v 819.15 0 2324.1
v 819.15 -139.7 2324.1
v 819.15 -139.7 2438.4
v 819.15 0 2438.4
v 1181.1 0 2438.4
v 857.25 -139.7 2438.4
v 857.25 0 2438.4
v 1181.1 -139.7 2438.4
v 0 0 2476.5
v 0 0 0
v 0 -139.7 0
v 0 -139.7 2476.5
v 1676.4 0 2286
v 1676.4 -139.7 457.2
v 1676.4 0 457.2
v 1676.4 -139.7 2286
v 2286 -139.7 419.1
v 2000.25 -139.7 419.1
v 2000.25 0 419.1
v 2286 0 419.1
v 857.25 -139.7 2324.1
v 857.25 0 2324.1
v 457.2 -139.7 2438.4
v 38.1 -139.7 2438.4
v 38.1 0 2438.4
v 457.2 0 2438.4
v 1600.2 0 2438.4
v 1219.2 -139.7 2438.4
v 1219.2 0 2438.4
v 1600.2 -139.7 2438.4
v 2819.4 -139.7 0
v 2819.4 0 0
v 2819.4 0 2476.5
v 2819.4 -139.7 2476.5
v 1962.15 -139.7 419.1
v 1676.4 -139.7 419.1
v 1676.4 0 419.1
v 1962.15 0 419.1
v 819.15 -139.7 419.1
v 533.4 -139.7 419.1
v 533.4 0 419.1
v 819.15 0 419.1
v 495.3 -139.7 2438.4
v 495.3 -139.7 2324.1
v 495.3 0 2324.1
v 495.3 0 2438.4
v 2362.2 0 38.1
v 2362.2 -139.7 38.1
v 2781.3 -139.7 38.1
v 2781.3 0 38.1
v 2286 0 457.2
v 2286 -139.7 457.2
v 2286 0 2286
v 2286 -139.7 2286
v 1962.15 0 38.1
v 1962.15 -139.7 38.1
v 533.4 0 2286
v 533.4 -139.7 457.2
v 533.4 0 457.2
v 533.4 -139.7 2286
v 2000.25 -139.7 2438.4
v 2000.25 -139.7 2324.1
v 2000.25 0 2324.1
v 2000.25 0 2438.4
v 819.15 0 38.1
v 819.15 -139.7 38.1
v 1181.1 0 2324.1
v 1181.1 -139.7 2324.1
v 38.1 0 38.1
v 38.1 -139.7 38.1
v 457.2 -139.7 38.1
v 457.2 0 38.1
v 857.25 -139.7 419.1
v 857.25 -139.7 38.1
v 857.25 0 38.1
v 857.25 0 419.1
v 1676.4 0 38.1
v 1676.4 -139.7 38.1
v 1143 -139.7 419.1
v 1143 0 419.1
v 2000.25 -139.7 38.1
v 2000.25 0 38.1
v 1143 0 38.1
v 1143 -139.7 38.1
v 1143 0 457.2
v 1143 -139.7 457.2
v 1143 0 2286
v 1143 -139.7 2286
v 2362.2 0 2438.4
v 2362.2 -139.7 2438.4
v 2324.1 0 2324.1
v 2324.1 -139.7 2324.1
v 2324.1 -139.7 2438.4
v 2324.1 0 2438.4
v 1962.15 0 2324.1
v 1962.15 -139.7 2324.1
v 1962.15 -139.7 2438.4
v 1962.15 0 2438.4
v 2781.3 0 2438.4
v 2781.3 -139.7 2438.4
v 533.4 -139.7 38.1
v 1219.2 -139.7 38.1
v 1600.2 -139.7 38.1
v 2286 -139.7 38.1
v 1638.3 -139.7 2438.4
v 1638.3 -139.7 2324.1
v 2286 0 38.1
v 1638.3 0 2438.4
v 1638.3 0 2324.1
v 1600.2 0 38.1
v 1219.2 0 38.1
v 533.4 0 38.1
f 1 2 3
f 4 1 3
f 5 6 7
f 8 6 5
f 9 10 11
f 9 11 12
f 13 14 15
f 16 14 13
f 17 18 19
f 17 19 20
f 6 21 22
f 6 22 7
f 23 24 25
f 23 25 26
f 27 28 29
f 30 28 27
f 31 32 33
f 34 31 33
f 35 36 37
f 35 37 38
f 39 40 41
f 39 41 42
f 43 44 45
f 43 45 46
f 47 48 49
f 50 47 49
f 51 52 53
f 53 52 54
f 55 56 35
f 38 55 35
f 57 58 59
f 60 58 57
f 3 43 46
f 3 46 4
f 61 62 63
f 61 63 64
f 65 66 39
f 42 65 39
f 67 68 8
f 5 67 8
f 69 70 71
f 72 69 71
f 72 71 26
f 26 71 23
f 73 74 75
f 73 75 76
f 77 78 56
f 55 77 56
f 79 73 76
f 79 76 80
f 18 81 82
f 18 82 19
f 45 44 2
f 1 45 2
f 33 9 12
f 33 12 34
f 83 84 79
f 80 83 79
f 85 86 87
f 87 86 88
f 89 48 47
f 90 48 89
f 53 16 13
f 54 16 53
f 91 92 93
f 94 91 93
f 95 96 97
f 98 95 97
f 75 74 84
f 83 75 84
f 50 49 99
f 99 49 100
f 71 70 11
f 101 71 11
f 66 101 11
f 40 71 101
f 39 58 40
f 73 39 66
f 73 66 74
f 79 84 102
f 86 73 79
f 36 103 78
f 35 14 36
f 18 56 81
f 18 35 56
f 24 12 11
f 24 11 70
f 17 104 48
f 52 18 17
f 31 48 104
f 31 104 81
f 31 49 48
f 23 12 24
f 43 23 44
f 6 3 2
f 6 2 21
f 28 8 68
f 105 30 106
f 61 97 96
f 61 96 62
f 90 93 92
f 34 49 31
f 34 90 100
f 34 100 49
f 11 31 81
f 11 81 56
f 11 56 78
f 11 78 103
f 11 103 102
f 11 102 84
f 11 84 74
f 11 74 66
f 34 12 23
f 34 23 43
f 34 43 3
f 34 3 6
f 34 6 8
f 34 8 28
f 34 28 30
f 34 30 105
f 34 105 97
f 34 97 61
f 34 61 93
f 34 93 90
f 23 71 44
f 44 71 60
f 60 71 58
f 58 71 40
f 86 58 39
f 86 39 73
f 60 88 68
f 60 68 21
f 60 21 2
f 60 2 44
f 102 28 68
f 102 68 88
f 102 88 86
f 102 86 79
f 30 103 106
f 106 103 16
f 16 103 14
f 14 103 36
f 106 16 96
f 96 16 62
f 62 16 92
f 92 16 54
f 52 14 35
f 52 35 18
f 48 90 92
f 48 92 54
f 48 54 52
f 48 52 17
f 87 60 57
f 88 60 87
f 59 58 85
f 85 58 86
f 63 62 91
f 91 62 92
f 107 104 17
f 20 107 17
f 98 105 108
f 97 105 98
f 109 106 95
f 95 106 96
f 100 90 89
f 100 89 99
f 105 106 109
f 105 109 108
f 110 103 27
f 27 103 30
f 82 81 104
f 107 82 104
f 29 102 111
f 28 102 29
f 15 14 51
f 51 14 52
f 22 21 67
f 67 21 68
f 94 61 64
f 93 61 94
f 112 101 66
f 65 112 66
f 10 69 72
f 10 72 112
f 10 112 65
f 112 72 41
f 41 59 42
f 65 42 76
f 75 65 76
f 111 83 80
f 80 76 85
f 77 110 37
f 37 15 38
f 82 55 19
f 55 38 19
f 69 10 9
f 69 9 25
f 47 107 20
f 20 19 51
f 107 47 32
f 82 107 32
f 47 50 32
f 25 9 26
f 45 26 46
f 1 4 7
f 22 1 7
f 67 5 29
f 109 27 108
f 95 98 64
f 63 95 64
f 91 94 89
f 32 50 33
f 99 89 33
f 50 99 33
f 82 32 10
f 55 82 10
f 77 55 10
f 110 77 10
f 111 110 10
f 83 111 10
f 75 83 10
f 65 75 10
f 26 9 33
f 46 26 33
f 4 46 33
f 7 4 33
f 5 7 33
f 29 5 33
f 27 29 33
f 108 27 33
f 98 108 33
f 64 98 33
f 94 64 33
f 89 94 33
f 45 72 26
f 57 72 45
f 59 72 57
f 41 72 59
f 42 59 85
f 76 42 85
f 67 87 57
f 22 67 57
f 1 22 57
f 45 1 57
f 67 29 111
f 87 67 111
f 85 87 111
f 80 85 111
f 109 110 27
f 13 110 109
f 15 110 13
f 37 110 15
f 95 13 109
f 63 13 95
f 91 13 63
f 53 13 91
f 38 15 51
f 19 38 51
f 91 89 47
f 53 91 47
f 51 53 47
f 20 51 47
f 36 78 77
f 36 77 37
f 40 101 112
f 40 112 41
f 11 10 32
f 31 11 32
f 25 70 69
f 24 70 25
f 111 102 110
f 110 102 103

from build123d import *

# Parameters (mm, degrees)
F0_W     = 2819.4
F0_H     = 2476.5
F1_DEPTH = 139.7
F2_W     = 609.6
F2_H     = 1828.8
F3_DEPTH = 139.701
F4_W     = 419.1
F4_H     = 2400.3
F4_W_2   = 381
F4_W_3   = 323.85
F4_H_2   = 114.3
F4_W_4   = 285.75
F4_H_3   = 381
F5_DEPTH = 139.701


with BuildPart() as f1:
    # F0 (on Front) → F1 (new body)
    with BuildSketch(Plane.XZ):
        with Locations((1409.7, 1238.25)):
            Rectangle(F0_W, F0_H)
    extrude(amount=F1_DEPTH)

    # F2 (on face) → F3 (cut, through all)
    with BuildSketch(Plane.XZ.offset(139.7)):
        with Locations((838.2, 1371.6)):
            Rectangle(F2_W, F2_H)
        with Locations((1981.2, 1371.6)):
            Rectangle(F2_W, F2_H)
    extrude(amount=-F3_DEPTH, mode=Mode.SUBTRACT)

    # F4 (on face) → F5 (cut, through all)
    with BuildSketch(Plane.XZ.offset(139.7)):
        with Locations((2571.75, 1238.25)):
            Rectangle(F4_W, F4_H)
        with Locations((1409.7, 1238.25)):
            Rectangle(F4_W_2, F4_H)
        with Locations((247.65, 1238.25)):
            Rectangle(F4_W, F4_H)
        with Locations((657.225, 2381.25)):
            Rectangle(F4_W_3, F4_H_2)
        with Locations((1019.175, 2381.25)):
            Rectangle(F4_W_3, F4_H_2)
        with Locations((676.275, 228.6)):
            Rectangle(F4_W_4, F4_H_3)
        with Locations((1000.125, 228.6)):
            Rectangle(F4_W_4, F4_H_3)
        with Locations((1800.225, 2381.25)):
            Rectangle(F4_W_3, F4_H_2)
        with Locations((2162.175, 2381.25)):
            Rectangle(F4_W_3, F4_H_2)
        with Locations((1819.275, 228.6)):
            Rectangle(F4_W_4, F4_H_3)
        with Locations((2143.125, 228.6)):
            Rectangle(F4_W_4, F4_H_3)
    extrude(amount=-F5_DEPTH, mode=Mode.SUBTRACT)


solid = f1.part
